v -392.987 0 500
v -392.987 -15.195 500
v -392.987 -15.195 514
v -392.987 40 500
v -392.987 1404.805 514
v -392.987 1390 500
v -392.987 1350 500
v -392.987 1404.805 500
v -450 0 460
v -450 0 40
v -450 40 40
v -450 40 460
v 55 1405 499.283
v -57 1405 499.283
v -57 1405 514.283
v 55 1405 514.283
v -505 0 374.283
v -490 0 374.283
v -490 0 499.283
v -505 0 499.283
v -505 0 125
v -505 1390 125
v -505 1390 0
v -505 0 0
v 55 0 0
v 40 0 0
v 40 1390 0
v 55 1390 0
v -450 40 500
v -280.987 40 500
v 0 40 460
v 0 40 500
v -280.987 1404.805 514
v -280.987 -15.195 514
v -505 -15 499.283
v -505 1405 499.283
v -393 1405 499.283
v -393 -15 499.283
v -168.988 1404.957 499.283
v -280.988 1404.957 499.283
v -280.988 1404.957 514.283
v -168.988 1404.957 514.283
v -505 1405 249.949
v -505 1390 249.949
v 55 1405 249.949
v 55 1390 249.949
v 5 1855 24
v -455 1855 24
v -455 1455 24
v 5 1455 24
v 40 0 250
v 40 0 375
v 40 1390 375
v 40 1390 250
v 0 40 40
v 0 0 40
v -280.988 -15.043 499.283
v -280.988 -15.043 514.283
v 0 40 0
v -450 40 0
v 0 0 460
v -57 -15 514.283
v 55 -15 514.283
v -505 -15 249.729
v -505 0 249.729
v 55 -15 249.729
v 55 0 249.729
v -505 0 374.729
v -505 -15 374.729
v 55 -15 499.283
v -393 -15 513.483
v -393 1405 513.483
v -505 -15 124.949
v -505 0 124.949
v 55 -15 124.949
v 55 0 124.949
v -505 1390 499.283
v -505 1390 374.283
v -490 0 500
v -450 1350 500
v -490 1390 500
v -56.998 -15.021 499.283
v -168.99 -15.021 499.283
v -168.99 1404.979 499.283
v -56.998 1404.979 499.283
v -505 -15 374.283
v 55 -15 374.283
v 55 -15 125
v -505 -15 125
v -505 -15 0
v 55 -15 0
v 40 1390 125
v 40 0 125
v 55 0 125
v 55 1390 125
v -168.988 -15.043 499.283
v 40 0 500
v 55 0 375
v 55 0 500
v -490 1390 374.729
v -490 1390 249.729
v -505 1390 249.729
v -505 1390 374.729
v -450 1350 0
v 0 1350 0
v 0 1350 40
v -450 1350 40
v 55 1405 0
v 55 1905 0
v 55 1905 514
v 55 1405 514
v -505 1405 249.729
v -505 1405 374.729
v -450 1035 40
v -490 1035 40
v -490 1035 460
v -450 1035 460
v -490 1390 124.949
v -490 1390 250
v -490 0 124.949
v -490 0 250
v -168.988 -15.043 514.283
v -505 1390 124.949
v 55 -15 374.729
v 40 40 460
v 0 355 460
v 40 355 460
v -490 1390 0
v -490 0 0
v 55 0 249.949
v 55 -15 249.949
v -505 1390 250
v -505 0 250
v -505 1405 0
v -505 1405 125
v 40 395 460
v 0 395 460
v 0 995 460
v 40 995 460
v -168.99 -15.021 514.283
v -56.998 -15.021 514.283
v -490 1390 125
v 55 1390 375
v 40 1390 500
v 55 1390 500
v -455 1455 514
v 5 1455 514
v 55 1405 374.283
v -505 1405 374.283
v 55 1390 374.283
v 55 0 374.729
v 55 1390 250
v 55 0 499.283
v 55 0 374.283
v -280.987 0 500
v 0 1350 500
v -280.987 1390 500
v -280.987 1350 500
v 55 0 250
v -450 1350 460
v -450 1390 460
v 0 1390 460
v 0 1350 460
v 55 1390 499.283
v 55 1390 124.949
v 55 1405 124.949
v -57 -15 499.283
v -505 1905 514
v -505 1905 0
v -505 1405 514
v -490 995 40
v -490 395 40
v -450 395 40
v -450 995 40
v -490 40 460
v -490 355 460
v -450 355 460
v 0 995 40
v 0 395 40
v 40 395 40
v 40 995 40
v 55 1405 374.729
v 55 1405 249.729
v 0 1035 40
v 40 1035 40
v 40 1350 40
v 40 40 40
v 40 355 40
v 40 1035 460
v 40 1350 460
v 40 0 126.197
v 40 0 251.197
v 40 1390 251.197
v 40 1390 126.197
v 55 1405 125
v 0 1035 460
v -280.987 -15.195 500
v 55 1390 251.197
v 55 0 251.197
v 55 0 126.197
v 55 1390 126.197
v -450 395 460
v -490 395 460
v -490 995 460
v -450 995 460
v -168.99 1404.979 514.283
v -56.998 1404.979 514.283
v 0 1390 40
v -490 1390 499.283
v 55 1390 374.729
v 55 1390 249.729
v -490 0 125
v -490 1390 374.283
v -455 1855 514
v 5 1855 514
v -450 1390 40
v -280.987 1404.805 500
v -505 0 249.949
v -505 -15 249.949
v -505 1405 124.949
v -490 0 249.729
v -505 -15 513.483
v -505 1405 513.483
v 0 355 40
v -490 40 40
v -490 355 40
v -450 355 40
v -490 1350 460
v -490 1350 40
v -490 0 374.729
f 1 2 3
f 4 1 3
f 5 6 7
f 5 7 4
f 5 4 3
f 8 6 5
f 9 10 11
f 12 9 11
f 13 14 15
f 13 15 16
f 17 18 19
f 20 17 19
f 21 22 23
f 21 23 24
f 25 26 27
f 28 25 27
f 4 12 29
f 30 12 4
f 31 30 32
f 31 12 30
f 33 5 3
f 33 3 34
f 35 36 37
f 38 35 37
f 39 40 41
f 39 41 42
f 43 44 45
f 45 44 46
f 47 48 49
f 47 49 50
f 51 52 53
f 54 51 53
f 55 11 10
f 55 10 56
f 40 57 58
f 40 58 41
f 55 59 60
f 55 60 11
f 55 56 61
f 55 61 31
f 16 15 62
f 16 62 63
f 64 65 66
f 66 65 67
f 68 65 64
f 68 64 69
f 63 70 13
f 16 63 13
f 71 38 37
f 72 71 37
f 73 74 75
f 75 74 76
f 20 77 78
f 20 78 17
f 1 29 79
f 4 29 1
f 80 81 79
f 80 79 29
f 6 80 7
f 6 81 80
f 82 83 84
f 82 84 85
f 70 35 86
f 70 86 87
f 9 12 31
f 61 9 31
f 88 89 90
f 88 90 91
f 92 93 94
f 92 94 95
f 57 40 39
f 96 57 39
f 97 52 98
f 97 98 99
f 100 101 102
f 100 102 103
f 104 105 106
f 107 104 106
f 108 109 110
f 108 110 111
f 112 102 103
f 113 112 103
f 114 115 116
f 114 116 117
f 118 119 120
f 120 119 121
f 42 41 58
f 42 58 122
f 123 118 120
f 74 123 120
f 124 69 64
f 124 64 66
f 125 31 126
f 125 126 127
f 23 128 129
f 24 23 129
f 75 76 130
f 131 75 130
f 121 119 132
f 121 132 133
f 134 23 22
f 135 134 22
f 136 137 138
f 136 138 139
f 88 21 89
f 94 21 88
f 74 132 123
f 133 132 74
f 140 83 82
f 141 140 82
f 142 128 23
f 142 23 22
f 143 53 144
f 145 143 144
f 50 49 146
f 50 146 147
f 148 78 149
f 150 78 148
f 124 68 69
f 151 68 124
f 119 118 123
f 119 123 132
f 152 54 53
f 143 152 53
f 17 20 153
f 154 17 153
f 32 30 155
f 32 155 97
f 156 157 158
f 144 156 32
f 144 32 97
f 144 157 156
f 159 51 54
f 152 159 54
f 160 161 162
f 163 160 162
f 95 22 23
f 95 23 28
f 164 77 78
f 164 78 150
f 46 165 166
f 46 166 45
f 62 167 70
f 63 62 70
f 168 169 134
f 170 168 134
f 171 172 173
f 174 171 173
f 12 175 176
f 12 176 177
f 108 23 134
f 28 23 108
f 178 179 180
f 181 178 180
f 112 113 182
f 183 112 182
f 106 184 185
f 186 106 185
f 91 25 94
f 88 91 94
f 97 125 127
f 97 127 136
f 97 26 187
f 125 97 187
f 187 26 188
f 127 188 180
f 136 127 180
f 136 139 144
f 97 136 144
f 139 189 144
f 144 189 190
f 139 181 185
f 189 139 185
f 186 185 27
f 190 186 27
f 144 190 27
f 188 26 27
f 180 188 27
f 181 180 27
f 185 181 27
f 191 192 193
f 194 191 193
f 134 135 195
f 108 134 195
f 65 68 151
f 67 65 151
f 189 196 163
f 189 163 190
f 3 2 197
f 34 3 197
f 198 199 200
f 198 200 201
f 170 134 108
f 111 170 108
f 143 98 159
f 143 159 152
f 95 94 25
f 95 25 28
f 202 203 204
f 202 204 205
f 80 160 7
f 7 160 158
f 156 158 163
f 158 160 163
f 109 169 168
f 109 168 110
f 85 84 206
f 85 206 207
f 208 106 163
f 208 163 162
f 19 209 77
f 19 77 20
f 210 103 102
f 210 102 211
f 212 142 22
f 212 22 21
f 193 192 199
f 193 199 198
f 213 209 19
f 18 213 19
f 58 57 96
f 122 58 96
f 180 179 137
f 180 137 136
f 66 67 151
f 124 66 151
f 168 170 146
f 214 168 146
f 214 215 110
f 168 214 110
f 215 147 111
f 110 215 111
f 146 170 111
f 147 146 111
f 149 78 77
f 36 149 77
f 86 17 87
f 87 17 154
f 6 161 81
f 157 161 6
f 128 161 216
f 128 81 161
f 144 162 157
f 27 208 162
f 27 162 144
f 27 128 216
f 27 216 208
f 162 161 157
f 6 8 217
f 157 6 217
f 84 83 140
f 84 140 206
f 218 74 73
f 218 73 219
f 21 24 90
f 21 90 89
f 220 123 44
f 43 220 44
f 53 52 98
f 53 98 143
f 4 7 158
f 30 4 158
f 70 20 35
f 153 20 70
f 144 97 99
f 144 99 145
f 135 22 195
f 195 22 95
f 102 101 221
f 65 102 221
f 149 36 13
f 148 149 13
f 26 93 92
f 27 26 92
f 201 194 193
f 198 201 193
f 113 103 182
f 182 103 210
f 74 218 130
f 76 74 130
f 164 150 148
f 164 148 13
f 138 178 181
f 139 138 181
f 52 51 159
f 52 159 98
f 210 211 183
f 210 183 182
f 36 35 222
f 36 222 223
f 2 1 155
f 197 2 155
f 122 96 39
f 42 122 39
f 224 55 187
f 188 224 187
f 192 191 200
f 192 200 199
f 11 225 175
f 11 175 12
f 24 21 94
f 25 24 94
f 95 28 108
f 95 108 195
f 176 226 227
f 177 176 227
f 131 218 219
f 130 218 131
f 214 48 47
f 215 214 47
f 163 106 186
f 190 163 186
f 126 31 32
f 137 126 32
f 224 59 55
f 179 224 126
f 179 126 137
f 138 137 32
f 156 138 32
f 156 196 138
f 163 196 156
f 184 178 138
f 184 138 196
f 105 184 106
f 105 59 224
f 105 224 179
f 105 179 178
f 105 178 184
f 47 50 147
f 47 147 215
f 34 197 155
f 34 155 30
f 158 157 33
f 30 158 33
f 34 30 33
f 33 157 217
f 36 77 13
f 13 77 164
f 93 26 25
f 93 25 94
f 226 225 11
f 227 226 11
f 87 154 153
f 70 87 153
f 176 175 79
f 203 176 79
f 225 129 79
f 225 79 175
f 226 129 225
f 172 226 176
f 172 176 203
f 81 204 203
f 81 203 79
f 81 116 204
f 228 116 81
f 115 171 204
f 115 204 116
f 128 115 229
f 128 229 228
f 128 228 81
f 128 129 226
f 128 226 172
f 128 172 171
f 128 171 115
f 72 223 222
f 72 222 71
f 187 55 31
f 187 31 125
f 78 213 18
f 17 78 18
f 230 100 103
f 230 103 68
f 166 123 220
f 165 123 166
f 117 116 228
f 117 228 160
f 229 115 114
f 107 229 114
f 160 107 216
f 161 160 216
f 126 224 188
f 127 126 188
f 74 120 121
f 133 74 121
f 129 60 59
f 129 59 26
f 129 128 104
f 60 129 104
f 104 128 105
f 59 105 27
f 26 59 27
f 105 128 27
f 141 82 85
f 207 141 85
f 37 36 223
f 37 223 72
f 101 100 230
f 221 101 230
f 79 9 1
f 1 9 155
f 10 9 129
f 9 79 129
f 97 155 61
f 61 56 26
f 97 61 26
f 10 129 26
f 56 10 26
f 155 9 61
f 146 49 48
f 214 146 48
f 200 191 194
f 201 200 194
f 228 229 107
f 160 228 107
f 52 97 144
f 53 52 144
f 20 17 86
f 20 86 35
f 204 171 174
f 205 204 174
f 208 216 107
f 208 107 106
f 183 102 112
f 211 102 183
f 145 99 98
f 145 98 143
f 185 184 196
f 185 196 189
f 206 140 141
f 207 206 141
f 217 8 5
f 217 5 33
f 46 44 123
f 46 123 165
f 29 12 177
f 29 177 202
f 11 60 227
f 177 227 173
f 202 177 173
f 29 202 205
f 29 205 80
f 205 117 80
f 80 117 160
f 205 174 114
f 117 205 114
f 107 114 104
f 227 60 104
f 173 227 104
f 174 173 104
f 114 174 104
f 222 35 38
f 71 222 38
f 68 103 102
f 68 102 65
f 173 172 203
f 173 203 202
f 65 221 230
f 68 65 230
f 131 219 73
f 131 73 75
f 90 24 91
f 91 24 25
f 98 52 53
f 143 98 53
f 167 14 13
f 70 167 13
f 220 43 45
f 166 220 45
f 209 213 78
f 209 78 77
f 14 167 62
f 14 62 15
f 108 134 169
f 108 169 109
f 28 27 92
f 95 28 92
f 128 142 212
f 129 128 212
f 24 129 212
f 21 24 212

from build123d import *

# Parameters (mm, degrees)
F0_W      = 1390
F0_H      = 40
F1_DEPTH  = 40
F2_W      = 40
F2_H      = 40
F3_DEPTH  = 490
F4_W      = 40
F4_H      = 40
F5_DEPTH  = 1310
F6_W      = 40
F6_H      = 40
F7_DEPTH  = 420
F8_W      = 530
F8_H      = 1390
F8_W_2    = 450
F8_H_2    = 1310
F9_DEPTH  = 40
F10_W     = 40
F10_H     = 40
F11_DEPTH = 420
F12_W     = 40
F12_H     = 40
F13_DEPTH = 420
F15_W     = 1390
F15_H     = 125
F16_DEPTH = 15
F17_W     = 1390
F17_H     = 125
F18_DEPTH = 15
F19_W     = 1390
F19_H     = 125
F20_DEPTH = 15
F21_W     = 1390
F21_H     = 125
F22_DEPTH = 15
F23_W     = 1390
F23_H     = 125
F24_DEPTH = 15
F25_W     = 1390
F25_H     = 125.050753
F26_DEPTH = 15
F27_W     = 1390
F27_H     = 125
F28_DEPTH = 15
F29_W     = 1390
F29_H     = 125
F30_DEPTH = 15
F32_W     = 560
F32_H     = 125
F33_DEPTH = 15
F34_W     = 560
F34_H     = 125
F35_DEPTH = 15
F36_W     = 560
F36_H     = 125
F37_DEPTH = 15
F38_W     = 560
F38_H     = 125
F39_DEPTH = 15
F42_W     = 112
F42_H     = 1420
F43_DEPTH = 14.2
F44_W     = 112
F44_H     = 1420
F45_DEPTH = 15
F47_W     = 112
F47_H     = 1420
F48_DEPTH = 14
F49_W     = 112
F49_H     = 1420
F50_DEPTH = 15
F51_W     = 111.991847
F51_H     = 1420
F52_DEPTH = 15
F53_W     = 560
F53_H     = 500
F54_DEPTH = 514
F55_W     = 460
F55_H     = 400
F56_DEPTH = 490


with BuildPart() as f1:
    # F0 (on Right) → F1 (new body)
    with BuildSketch(Plane.YZ):
        with Locations((695, 20)):
            Rectangle(F0_W, F0_H)
    extrude(amount=F1_DEPTH)

    # F2 (on face) → F3 (join)
    with BuildSketch(Plane(origin=(0, 0, 0), x_dir=(0, -1, 0), z_dir=(-1, 0, 0))):
        with Locations((-1370, 20)):
            Rectangle(F2_W, F2_H)
        with Locations((-20, 20)):
            Rectangle(F2_W, F2_H)
    extrude(amount=F3_DEPTH)

    # F4 (on face) → F5 (join)
    with BuildSketch(Plane.XZ.offset(-1350)):
        with Locations((-470, 20)):
            Rectangle(F4_W, F4_H)
    extrude(amount=F5_DEPTH)

    # F6 (on face) → F7 (join)
    with BuildSketch(Plane.XY.offset(40)):
        with Locations((-470, 1370)):
            Rectangle(F6_W, F6_H)
        with Locations((20, 1370)):
            Rectangle(F6_W, F6_H)
        with Locations((20, 20)):
            Rectangle(F6_W, F6_H)
        with Locations((-470, 20)):
            Rectangle(F6_W, F6_H)
    extrude(amount=F7_DEPTH)

    # F8 (on face) → F9 (join)
    with BuildSketch(Plane.XY.offset(460)):
        with Locations((-225, 695)):
            Rectangle(F8_W, F8_H)
        with Locations((-225, 695)):
            Rectangle(F8_W_2, F8_H_2, mode=Mode.SUBTRACT)
    extrude(amount=F9_DEPTH)

    # F10 (on face) → F11 (join)
    with BuildSketch(Plane.XY.offset(40)):
        with Locations((-470, 1015)):
            Rectangle(F10_W, F10_H)
        with Locations((-470, 375)):
            Rectangle(F10_W, F10_H)
    extrude(amount=F11_DEPTH)

    # F12 (on face) → F13 (join)
    with BuildSketch(Plane.XY.offset(40)):
        with Locations((20, 1015)):
            Rectangle(F12_W, F12_H)
        with Locations((20, 375)):
            Rectangle(F12_W, F12_H)
    extrude(amount=F13_DEPTH)

    # F47 (on face) → F48 (join)
    with BuildSketch(Plane.XY.offset(500)):
        with Locations((-336.986673, 694.804775)):
            Rectangle(F47_W, F47_H)
    extrude(amount=F48_DEPTH)


with BuildPart() as f16:
    # F15 (on face) → F16 (new body)
    with BuildSketch(Plane.YZ.offset(40)):
        with Locations((695, 437.5)):
            Rectangle(F15_W, F15_H)
    extrude(amount=F16_DEPTH)


with BuildPart() as f18:
    # F17 (on face) → F18 (new body)
    with BuildSketch(Plane.YZ.offset(40)):
        with Locations((695, 62.5)):
            Rectangle(F17_W, F17_H)
    extrude(amount=F18_DEPTH)


with BuildPart() as f20:
    # F19 (on face) → F20 (new body)
    with BuildSketch(Plane.YZ.offset(40)):
        with Locations((695, 188.696638)):
            Rectangle(F19_W, F19_H)
    extrude(amount=F20_DEPTH)


with BuildPart() as f22:
    # F21 (on face) → F22 (new body)
    with BuildSketch(Plane.YZ.offset(40)):
        with Locations((695, 312.5)):
            Rectangle(F21_W, F21_H)
    extrude(amount=F22_DEPTH)


with BuildPart() as f24:
    # F23 (on face) → F24 (new body)
    with BuildSketch(Plane(origin=(-490, 0, 0), x_dir=(0, -1, 0), z_dir=(-1, 0, 0))):
        with Locations((-695, 62.5)):
            Rectangle(F23_W, F23_H)
    extrude(amount=F24_DEPTH)


with BuildPart() as f26:
    # F25 (on face) → F26 (new body)
    with BuildSketch(Plane(origin=(-490, 0, 0), x_dir=(0, -1, 0), z_dir=(-1, 0, 0))):
        with Locations((-695, 187.474624)):
            Rectangle(F25_W, F25_H)
    extrude(amount=F26_DEPTH)


with BuildPart() as f28:
    # F27 (on face) → F28 (new body)
    with BuildSketch(Plane(origin=(-490, 0, 0), x_dir=(0, -1, 0), z_dir=(-1, 0, 0))):
        with Locations((-695, 312.229292)):
            Rectangle(F27_W, F27_H)
    extrude(amount=F28_DEPTH)


with BuildPart() as f30:
    # F29 (on face) → F30 (new body)
    with BuildSketch(Plane(origin=(-490, 0, 0), x_dir=(0, -1, 0), z_dir=(-1, 0, 0))):
        with Locations((-695, 436.783221)):
            Rectangle(F29_W, F29_H)
    extrude(amount=F30_DEPTH)


with BuildPart() as f33:
    # F32 (on face) → F33 (new body)
    with BuildSketch(Plane.XZ):
        with Locations((-225, 62.5)):
            Rectangle(F32_W, F32_H)
    extrude(amount=F33_DEPTH)


with BuildPart() as f35:
    # F34 (on face) → F35 (new body)
    with BuildSketch(Plane.XZ):
        with Locations((-225, 187.449247)):
            Rectangle(F34_W, F34_H)
    extrude(amount=F35_DEPTH)


with BuildPart() as f37:
    # F36 (on face) → F37 (new body)
    with BuildSketch(Plane.XZ):
        with Locations((-225, 312.229292)):
            Rectangle(F36_W, F36_H)
    extrude(amount=F37_DEPTH)


with BuildPart() as f39:
    # F38 (on face) → F39 (new body)
    with BuildSketch(Plane.XZ):
        with Locations((-225, 436.783221)):
            Rectangle(F38_W, F38_H)
    extrude(amount=F39_DEPTH)


with BuildPart() as f40_1:
    # F40: instance of F39
    add(f39.part.mirror(Plane(origin=(-225, 695, 250), x_dir=(1, 0, 0), z_dir=(0, -1, 0))))


with BuildPart() as f40_2:
    # F40: instance of F37
    add(f37.part.mirror(Plane(origin=(-225, 695, 250), x_dir=(1, 0, 0), z_dir=(0, -1, 0))))


with BuildPart() as f40_3:
    # F40: instance of F35
    add(f35.part.mirror(Plane(origin=(-225, 695, 250), x_dir=(1, 0, 0), z_dir=(0, -1, 0))))


with BuildPart() as f40_4:
    # F40: instance of F33
    add(f33.part.mirror(Plane(origin=(-225, 695, 250), x_dir=(1, 0, 0), z_dir=(0, -1, 0))))


with BuildPart() as f43:
    # F42 (on face) → F43 (new body)
    with BuildSketch(Plane.XY.offset(499.283221)):
        with Locations((-449, 695)):
            Rectangle(F42_W, F42_H)
    extrude(amount=F43_DEPTH)


with BuildPart() as f45:
    # F44 (on face) → F45 (new body)
    with BuildSketch(Plane.XY.offset(499.283221)):
        with Locations((-1, 695)):
            Rectangle(F44_W, F44_H)
    extrude(amount=F45_DEPTH)


with BuildPart() as f50:
    # F49 (on face) → F50 (new body)
    with BuildSketch(Plane.XY.offset(499.283221)):
        with Locations((-224.987579, 694.956858)):
            Rectangle(F49_W, F49_H)
    extrude(amount=F50_DEPTH)


with BuildPart() as f52:
    # F51 (on face) → F52 (new body)
    with BuildSketch(Plane.XY.offset(499.283221)):
        with Locations((-112.994324, 694.979473)):
            Rectangle(F51_W, F51_H)
    extrude(amount=F52_DEPTH)


with BuildPart() as f54:
    # F53 (on face) → F54 (new body)
    with BuildSketch(Plane(origin=(0, 0, 0), x_dir=(1, 0, 0), z_dir=(0, 0, -1))):
        with Locations((-225, -1655)):
            Rectangle(F53_W, F53_H)
    extrude(amount=-F54_DEPTH)

    # F55 (on face) → F56 (cut)
    with BuildSketch(Plane.XY.offset(514)):
        with Locations((-225, 1655)):
            Rectangle(F55_W, F55_H)
    extrude(amount=-F56_DEPTH, mode=Mode.SUBTRACT)


solid = Compound([f1.part, f16.part, f18.part, f20.part, f22.part, f24.part, f26.part, f28.part, f30.part, f33.part, f35.part, f37.part, f39.part, f40_1.part, f40_2.part, f40_3.part, f40_4.part, f43.part, f45.part, f50.part, f52.part, f54.part])
